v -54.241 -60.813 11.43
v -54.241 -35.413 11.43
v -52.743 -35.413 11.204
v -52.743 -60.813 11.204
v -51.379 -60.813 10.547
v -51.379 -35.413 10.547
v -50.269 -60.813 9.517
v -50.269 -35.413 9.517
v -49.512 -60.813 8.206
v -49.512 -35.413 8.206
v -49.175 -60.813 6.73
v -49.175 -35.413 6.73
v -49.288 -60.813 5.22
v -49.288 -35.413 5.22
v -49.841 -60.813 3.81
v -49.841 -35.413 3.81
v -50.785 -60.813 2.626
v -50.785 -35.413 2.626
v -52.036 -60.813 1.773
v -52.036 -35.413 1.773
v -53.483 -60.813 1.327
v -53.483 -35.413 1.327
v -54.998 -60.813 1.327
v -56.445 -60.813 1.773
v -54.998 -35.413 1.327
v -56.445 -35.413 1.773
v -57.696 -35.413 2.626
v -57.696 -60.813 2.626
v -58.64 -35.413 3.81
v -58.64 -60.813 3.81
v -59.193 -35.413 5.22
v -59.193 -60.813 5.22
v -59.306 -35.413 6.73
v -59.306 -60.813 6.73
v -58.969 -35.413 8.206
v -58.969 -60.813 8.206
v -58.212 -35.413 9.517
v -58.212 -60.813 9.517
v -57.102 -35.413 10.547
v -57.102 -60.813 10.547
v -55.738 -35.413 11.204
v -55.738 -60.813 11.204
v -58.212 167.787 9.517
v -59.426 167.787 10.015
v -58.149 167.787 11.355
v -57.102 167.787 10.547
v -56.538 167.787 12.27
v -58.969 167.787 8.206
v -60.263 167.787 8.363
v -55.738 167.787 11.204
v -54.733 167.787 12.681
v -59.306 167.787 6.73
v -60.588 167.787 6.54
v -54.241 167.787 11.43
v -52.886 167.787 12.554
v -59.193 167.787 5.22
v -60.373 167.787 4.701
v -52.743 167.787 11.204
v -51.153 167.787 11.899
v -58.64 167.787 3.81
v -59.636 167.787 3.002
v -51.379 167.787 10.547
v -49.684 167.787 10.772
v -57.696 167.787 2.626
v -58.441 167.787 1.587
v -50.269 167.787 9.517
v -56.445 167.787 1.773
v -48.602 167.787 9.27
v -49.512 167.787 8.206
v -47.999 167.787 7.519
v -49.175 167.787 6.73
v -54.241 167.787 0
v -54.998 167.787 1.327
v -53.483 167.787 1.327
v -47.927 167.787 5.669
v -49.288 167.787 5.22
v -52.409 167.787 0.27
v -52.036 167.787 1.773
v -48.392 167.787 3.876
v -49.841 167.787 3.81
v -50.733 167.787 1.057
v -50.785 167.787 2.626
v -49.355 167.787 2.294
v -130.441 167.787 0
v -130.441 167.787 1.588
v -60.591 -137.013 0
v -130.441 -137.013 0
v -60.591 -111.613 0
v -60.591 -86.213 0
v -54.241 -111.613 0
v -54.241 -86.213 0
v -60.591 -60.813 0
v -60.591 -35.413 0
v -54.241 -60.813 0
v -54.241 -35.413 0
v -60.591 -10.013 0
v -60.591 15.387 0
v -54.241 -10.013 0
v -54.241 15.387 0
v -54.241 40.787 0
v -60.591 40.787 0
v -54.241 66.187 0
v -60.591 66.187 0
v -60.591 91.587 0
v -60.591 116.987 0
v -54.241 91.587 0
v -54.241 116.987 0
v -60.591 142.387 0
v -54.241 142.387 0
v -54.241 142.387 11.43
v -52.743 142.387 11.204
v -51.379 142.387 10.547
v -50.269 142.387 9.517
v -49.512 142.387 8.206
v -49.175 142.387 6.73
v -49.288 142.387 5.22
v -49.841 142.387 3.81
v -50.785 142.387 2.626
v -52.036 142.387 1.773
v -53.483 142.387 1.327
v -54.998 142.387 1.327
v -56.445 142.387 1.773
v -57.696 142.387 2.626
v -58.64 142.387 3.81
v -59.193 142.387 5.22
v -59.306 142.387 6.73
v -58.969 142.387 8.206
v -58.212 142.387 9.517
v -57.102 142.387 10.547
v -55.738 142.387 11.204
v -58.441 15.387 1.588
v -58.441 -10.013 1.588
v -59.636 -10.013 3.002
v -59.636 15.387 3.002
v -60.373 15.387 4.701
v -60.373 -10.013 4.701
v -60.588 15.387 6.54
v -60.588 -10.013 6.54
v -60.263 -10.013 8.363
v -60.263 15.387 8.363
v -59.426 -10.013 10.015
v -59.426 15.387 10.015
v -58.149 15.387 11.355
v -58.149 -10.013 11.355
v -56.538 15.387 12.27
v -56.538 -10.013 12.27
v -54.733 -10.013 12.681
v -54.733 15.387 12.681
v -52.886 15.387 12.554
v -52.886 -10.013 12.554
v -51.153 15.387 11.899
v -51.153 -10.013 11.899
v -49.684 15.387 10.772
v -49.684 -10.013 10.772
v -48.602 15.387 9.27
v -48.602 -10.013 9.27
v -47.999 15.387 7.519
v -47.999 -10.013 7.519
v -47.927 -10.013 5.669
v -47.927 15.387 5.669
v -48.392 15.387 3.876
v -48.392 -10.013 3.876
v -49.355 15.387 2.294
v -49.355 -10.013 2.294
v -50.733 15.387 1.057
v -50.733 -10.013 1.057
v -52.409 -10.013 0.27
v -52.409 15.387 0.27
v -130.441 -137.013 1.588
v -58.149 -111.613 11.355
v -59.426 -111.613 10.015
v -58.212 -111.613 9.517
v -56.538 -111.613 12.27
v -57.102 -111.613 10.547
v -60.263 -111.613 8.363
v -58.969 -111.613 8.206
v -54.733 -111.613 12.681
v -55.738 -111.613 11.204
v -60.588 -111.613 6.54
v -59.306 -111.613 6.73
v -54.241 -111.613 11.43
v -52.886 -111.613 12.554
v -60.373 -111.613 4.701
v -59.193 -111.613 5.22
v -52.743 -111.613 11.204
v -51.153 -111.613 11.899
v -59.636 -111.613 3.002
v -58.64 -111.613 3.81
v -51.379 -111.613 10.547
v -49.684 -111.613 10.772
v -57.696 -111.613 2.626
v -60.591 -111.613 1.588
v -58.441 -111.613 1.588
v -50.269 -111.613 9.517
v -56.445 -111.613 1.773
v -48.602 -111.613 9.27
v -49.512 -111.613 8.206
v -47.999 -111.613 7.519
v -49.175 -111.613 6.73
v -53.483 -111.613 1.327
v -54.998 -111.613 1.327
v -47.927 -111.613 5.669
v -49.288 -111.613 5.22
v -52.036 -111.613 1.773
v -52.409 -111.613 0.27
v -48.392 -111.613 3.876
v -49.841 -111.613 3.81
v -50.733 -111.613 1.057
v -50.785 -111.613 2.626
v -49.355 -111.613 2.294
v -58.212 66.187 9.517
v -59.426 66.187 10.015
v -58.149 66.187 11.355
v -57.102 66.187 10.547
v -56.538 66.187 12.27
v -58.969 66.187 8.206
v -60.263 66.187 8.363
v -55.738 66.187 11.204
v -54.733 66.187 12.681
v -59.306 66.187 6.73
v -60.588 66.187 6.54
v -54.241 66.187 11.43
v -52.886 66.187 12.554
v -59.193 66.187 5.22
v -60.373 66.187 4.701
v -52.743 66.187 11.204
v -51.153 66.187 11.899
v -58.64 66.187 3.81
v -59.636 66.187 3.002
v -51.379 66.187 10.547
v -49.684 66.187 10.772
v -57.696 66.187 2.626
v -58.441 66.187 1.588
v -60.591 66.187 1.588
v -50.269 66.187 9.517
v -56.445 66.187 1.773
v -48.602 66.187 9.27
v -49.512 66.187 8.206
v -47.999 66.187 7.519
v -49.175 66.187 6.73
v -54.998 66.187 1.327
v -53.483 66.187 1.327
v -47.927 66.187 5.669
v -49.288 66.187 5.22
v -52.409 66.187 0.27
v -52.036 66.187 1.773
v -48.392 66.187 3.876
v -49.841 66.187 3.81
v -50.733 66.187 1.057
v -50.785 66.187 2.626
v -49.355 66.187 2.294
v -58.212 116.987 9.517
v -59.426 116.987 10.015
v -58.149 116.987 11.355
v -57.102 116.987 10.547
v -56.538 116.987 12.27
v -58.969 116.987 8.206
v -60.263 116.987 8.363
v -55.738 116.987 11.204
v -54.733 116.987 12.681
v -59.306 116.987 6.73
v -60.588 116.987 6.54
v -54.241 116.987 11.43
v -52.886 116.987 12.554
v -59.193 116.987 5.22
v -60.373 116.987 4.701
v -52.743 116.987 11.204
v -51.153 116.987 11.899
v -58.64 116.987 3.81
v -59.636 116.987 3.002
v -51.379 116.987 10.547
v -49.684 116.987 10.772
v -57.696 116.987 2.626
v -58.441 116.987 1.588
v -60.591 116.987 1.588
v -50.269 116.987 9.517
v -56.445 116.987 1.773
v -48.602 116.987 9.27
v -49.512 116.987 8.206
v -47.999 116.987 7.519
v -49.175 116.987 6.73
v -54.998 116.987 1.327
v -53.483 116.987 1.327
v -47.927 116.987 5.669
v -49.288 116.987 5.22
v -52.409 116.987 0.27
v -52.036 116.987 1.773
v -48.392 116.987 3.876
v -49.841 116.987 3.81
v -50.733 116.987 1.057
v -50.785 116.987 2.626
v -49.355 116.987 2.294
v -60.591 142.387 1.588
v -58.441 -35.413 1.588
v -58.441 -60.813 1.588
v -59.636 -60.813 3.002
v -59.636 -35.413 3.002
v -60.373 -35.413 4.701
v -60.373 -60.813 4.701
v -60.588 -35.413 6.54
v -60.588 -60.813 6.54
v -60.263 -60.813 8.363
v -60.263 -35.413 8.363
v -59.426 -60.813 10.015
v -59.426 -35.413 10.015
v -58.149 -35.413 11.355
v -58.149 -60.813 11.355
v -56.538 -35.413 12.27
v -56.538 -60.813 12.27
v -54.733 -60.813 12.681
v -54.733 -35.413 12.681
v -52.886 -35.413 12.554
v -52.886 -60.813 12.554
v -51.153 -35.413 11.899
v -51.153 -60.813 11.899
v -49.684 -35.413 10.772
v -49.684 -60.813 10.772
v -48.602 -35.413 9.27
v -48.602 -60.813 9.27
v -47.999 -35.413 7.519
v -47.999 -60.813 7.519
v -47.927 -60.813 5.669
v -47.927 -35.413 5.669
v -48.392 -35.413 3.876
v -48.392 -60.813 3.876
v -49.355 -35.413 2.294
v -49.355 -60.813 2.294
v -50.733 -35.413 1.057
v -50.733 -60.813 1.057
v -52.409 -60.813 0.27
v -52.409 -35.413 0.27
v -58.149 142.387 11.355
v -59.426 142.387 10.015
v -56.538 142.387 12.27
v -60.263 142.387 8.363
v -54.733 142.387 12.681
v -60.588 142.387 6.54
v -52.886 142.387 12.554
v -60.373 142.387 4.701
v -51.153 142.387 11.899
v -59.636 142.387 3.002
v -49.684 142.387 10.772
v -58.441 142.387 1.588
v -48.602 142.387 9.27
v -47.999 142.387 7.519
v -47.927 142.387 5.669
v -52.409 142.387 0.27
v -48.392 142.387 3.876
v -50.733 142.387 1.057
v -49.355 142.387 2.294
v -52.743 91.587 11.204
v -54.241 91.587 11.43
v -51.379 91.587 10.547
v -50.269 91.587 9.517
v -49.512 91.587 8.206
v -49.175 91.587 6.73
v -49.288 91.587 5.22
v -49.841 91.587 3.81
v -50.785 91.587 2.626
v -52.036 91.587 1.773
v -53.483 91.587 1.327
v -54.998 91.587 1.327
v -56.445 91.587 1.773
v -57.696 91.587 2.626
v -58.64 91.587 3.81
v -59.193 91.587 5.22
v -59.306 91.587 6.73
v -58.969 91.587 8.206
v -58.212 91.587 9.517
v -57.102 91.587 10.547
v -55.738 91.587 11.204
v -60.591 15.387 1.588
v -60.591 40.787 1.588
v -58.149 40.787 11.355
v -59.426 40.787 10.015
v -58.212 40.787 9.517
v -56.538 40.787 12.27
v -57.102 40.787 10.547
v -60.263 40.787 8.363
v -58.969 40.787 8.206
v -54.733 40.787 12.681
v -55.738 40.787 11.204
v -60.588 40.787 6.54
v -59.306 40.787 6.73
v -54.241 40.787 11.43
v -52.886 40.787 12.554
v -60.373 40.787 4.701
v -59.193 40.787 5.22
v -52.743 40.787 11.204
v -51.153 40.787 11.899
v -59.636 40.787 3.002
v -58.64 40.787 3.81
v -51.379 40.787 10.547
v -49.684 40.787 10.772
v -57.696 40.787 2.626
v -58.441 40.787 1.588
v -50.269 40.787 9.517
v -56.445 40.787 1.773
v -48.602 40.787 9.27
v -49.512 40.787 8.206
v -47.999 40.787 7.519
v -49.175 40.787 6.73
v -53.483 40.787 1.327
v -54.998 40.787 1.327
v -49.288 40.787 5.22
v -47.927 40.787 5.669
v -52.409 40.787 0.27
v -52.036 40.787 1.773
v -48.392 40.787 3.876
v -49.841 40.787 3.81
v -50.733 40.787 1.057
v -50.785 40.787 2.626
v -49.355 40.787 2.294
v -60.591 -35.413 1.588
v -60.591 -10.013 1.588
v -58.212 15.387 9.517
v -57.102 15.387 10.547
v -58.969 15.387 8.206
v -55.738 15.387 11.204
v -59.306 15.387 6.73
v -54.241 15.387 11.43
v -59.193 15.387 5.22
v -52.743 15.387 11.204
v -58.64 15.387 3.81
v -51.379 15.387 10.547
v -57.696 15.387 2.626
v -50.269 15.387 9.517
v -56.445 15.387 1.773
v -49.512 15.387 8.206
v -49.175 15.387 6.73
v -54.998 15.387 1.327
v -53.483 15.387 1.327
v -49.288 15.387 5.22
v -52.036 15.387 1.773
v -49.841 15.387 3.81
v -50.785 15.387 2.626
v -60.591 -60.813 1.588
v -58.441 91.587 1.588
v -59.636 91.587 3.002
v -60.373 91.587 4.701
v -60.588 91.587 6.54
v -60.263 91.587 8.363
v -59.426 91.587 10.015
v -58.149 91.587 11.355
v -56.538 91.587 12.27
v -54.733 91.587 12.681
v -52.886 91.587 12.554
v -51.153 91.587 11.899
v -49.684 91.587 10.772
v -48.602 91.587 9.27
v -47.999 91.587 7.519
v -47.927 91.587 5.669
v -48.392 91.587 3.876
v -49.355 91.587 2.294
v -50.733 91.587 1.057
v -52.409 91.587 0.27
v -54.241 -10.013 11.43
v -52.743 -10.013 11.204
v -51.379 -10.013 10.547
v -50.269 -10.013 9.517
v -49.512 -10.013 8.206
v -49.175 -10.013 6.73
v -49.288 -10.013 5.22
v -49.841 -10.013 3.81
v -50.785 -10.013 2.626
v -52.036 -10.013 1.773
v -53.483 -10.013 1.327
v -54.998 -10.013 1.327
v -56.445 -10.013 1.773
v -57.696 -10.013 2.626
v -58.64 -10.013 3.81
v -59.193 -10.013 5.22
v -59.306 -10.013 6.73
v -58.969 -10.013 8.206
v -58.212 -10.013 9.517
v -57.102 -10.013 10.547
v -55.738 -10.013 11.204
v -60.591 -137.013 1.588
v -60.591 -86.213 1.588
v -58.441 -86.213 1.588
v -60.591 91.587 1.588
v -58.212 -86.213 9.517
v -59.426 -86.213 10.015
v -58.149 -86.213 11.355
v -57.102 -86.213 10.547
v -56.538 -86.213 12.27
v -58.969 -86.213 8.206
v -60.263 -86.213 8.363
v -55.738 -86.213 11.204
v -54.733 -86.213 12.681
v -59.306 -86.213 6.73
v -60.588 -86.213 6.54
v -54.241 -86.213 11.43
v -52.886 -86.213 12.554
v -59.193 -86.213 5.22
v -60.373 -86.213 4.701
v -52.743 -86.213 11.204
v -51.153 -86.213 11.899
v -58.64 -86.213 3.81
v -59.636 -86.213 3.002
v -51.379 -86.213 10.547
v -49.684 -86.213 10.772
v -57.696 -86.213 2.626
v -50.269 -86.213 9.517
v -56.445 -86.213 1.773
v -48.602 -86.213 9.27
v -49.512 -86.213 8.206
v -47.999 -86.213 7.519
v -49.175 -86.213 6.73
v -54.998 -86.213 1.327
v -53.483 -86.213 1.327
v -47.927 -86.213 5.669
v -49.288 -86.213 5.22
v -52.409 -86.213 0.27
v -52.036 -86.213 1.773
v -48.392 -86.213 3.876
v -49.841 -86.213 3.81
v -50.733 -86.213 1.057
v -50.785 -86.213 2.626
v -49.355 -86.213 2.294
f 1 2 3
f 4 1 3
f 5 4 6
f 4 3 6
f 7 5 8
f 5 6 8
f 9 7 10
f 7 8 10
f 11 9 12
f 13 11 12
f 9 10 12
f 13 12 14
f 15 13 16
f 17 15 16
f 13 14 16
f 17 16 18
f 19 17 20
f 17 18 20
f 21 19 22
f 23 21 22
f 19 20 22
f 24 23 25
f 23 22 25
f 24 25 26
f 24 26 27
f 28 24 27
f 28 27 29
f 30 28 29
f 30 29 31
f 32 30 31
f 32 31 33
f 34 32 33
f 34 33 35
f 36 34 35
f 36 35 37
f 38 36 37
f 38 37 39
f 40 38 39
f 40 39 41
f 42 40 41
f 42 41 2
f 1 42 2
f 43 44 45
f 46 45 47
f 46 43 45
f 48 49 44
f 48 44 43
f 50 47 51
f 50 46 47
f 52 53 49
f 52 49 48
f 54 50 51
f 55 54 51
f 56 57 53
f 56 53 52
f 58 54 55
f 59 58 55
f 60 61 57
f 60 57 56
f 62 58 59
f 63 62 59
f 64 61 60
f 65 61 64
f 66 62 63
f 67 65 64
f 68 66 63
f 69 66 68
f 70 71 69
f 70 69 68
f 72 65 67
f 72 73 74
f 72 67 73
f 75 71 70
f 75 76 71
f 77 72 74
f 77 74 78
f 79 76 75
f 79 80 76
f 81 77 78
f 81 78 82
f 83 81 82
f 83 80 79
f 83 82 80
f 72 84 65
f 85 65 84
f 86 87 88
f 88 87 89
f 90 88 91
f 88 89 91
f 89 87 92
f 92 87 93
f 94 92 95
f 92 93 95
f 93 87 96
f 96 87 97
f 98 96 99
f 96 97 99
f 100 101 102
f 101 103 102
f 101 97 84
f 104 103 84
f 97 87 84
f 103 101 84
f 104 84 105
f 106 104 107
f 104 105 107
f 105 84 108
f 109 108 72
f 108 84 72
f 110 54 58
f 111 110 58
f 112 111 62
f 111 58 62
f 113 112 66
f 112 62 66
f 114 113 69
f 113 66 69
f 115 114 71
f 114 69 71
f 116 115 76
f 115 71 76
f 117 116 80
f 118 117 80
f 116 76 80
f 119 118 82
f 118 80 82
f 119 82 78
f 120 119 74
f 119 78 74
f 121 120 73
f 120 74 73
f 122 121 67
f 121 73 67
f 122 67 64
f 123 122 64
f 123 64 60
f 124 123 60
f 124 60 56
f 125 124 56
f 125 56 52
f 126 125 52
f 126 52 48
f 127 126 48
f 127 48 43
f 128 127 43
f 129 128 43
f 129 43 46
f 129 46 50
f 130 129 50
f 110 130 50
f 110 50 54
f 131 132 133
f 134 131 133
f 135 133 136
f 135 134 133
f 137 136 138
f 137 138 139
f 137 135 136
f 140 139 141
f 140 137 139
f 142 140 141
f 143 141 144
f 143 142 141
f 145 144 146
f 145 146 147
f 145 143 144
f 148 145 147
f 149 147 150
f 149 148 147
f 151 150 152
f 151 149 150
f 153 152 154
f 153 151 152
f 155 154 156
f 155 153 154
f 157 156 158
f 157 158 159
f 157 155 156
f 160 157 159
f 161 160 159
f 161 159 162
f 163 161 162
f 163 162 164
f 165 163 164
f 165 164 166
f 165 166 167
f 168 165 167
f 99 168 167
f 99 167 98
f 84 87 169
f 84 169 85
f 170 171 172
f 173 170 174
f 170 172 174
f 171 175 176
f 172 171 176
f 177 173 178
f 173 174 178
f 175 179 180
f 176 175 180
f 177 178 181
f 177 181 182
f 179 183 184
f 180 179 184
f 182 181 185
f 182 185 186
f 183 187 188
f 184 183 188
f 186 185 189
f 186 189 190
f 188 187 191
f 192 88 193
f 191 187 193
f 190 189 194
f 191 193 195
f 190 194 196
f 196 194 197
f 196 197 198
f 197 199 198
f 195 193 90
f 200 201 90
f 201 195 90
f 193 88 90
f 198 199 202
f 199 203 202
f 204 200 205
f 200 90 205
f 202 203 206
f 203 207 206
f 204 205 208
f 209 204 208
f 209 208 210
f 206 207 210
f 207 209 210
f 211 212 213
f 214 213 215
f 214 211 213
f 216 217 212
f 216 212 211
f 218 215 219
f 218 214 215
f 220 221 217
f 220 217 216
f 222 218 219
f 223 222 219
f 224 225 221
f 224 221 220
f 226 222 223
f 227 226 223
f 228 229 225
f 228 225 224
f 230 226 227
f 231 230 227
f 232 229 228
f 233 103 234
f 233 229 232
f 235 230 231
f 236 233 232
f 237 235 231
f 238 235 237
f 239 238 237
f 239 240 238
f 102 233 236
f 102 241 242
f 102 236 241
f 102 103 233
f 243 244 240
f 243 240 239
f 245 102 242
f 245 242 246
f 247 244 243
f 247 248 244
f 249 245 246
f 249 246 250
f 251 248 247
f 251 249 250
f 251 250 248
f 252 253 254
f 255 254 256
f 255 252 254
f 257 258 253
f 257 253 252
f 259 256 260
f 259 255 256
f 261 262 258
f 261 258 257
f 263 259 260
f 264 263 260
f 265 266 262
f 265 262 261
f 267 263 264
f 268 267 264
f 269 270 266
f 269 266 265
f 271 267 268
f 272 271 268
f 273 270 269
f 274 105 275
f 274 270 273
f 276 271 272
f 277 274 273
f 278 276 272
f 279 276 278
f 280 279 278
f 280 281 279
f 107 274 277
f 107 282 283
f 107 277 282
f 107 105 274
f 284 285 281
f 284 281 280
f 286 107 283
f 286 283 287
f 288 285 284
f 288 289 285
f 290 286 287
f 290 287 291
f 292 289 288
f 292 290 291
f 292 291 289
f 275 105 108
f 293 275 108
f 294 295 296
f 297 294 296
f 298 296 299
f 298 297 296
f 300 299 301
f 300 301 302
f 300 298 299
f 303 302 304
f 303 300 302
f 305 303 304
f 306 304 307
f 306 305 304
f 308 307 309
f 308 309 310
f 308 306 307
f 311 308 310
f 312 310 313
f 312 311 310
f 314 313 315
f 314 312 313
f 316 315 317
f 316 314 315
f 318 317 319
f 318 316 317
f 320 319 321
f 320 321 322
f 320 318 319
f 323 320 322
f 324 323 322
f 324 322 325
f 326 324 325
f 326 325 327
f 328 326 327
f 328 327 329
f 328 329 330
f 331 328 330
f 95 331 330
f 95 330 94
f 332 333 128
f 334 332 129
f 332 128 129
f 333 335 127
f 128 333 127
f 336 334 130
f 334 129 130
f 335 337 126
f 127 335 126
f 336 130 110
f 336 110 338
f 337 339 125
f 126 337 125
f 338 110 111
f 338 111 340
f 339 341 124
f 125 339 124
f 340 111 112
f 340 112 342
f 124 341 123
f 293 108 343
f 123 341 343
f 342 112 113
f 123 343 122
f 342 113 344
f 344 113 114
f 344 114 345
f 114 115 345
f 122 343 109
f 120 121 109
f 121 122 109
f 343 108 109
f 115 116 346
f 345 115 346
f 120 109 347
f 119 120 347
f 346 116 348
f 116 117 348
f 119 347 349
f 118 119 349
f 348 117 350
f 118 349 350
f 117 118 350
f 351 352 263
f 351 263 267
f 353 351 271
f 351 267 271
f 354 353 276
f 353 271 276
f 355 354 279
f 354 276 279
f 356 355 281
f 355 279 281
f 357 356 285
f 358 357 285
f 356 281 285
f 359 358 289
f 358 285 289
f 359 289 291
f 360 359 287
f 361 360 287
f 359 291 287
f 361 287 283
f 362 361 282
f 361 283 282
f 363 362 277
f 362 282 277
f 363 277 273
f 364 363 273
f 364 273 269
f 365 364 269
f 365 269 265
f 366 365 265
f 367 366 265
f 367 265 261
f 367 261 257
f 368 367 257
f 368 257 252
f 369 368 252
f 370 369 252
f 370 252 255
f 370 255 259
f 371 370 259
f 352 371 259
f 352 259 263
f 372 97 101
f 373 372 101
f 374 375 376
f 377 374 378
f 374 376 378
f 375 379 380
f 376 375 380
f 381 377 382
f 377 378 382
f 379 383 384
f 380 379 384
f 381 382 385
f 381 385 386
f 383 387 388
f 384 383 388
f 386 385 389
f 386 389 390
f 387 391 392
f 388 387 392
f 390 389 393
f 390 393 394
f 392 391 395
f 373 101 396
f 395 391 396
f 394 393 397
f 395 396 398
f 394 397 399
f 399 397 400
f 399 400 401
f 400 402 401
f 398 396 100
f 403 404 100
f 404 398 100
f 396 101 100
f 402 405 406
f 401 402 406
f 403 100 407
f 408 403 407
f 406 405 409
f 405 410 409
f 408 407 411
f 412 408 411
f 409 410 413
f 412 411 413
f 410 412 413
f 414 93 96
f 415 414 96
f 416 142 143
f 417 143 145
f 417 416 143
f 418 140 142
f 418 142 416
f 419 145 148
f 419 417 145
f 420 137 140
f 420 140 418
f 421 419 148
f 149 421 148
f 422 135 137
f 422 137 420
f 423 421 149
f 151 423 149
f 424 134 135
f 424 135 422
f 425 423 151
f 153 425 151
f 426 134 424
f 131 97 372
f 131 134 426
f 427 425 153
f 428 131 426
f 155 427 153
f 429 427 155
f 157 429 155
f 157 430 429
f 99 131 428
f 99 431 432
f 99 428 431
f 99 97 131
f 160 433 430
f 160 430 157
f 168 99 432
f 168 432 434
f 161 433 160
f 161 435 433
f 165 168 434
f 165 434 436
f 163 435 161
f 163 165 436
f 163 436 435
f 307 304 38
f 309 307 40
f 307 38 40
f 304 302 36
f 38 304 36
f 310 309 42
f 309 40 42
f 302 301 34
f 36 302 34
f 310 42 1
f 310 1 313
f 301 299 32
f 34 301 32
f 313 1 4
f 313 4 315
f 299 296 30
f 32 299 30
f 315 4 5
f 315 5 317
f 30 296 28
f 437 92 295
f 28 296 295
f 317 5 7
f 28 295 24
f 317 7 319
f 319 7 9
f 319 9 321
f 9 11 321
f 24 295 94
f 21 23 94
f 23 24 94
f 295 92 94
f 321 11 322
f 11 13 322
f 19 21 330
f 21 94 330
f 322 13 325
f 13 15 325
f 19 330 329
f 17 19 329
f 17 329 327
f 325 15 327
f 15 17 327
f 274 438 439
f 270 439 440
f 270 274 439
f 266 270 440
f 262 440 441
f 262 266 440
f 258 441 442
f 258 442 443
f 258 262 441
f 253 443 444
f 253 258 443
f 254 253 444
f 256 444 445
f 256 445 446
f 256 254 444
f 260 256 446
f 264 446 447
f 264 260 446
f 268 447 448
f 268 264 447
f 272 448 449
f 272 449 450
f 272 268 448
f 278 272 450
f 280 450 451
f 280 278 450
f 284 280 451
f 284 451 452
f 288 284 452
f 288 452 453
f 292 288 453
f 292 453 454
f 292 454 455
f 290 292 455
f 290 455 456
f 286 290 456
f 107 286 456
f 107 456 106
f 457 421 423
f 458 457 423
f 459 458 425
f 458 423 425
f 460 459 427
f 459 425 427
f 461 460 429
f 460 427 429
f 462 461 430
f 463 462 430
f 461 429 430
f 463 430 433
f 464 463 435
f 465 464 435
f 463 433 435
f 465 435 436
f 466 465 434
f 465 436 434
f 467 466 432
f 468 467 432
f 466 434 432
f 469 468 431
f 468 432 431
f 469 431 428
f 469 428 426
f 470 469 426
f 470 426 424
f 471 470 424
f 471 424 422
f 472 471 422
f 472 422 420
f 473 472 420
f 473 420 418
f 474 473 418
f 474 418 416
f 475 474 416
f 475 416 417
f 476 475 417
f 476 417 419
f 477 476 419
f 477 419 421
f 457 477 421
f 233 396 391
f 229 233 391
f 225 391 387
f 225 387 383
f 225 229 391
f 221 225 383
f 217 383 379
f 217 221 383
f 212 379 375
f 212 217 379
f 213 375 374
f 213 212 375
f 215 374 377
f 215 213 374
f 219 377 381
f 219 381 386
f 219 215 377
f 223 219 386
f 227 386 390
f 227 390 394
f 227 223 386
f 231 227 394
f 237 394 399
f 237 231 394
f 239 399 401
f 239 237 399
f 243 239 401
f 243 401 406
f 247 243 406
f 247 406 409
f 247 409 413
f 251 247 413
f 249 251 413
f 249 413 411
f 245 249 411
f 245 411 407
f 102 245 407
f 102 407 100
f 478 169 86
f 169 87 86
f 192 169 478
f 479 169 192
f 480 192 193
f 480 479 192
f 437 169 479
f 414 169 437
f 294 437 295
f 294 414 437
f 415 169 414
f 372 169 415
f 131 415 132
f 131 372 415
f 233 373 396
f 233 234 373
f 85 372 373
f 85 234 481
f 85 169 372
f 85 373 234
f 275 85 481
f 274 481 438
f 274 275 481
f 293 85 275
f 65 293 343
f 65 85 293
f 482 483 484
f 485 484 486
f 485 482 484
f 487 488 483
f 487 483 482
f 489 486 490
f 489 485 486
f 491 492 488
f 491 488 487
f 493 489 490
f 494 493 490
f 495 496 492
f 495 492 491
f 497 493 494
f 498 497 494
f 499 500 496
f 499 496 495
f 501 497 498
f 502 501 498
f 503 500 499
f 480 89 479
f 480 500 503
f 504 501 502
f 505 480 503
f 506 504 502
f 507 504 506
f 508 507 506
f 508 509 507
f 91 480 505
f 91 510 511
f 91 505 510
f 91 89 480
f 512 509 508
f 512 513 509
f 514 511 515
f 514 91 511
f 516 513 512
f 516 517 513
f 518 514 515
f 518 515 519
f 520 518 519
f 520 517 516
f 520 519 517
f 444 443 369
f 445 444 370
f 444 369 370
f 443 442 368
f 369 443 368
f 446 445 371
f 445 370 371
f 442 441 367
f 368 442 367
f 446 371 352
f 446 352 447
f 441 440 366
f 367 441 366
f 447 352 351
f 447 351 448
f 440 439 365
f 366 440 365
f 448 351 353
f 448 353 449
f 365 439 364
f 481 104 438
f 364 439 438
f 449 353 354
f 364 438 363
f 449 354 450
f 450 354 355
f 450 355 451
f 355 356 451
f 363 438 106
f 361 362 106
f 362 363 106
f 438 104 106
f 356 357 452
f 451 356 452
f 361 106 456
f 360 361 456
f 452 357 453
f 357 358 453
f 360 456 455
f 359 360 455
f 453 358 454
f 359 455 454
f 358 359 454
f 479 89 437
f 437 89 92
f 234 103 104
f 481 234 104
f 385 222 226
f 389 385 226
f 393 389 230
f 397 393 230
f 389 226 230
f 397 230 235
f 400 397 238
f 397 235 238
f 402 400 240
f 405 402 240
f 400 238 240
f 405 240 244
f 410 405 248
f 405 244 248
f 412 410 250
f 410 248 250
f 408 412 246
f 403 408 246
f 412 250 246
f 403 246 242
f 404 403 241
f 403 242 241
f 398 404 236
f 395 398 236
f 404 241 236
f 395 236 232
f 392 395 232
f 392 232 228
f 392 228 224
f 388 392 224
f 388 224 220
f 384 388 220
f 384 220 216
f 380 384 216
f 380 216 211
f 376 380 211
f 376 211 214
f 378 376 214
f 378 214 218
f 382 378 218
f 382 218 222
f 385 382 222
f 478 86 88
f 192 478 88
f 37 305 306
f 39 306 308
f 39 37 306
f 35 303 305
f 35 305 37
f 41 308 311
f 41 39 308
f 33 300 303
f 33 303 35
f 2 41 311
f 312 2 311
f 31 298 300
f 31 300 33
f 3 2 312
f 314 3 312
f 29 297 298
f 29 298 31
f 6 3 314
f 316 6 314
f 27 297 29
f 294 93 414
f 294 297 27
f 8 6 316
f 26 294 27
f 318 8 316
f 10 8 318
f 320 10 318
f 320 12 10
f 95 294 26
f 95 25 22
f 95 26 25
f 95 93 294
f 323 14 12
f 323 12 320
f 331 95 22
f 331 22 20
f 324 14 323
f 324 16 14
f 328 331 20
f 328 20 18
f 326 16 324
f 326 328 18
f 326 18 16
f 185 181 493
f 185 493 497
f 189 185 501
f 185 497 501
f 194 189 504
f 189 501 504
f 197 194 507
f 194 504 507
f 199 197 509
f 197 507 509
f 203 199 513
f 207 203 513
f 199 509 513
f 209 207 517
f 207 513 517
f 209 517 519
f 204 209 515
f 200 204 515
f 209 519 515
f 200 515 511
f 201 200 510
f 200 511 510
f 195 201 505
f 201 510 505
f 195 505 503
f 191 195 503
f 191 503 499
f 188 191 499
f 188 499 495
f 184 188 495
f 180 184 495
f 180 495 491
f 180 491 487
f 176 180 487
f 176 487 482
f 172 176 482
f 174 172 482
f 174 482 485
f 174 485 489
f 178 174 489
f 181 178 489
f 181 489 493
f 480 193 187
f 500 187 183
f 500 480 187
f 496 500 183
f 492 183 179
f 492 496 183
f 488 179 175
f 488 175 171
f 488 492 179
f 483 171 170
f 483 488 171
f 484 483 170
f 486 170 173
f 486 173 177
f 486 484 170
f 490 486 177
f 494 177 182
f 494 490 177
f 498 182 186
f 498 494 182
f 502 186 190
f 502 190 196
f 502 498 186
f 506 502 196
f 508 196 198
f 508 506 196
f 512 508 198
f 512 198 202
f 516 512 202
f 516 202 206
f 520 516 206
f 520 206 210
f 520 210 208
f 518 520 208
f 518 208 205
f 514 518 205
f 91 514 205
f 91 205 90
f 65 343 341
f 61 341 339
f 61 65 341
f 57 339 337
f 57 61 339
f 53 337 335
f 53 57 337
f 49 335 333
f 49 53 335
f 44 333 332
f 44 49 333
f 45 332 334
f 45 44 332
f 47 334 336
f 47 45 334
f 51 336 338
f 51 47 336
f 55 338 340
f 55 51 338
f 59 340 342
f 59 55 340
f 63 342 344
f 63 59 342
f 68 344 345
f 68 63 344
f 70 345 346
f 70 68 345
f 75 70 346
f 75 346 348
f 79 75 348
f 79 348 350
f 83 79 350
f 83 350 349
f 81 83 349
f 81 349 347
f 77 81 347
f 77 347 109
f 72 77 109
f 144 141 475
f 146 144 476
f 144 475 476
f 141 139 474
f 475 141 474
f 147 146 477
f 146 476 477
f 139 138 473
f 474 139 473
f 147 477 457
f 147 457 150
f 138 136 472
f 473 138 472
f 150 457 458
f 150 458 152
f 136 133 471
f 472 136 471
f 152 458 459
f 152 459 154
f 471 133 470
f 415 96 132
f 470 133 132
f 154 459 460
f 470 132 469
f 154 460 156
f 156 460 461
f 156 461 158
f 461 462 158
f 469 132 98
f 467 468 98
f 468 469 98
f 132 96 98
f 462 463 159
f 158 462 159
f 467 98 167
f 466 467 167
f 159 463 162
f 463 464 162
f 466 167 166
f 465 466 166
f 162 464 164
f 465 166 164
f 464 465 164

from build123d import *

# Parameters (mm, degrees)
SKETCH1_W               = 76.2
SKETCH1_H               = 304.8
BOSS_EXTRUDE1_DEPTH     = 1.5875
SKETCH2_R               = 6.35
BOSS_EXTRUDE2_DEPTH     = 304.8
CUT_EXTRUDE1_DEPTH      = 72.4535
CUT_EXTRUDE1_DEPTH_BACK = 72.4535
SKETCH3_W               = 22.233491501
SKETCH3_H               = 25.4
SKETCH3_W_2             = 25.169990379
SKETCH3_W_3             = 20.176908814
SKETCH4_R               = 5.08
CUT_EXTRUDE2_DEPTH      = 332.781682839


with BuildPart() as part:
    # Sketch1 → Boss-Extrude1 (new body)
    with BuildSketch(Plane.XY):
        with Locations((-92.340618933, 15.386782554)):
            Rectangle(SKETCH1_W, SKETCH1_H)
    extrude(amount=BOSS_EXTRUDE1_DEPTH)

    # Sketch2 → Boss-Extrude2 (add)
    with BuildSketch(Plane(origin=(0, 167.786782554, 0), x_dir=(1, 0, 0), z_dir=(0, 1, 0))):
        with Locations((-54.240618933, -6.35)):
            Circle(SKETCH2_R)
    extrude(amount=-BOSS_EXTRUDE2_DEPTH)

    # Sketch3 → Cut-Extrude1 (cut, two sides: drawn at the far end of the back side and taken through both)
    with BuildSketch(Plane.XY.offset(1.5875).offset(-CUT_EXTRUDE1_DEPTH_BACK)):
        with Locations((-49.473873183, 129.686782554)):
            Rectangle(SKETCH3_W, SKETCH3_H)
        with Locations((-49.473873183, 78.886782554)):
            Rectangle(SKETCH3_W, SKETCH3_H)
        with Locations((-49.473873183, 28.086782554)):
            Rectangle(SKETCH3_W, SKETCH3_H)
        with Locations((-49.473873183, -22.713217446)):
            Rectangle(SKETCH3_W, SKETCH3_H)
        with Locations((-48.005623744, -73.513217446)):
            Rectangle(SKETCH3_W_2, SKETCH3_H)
        with Locations((-50.502164526, -124.313217446)):
            Rectangle(SKETCH3_W_3, SKETCH3_H)
    extrude(amount=CUT_EXTRUDE1_DEPTH + CUT_EXTRUDE1_DEPTH_BACK, mode=Mode.SUBTRACT)

    # Sketch4 → Cut-Extrude2 (cut, through all)
    with BuildSketch(Plane(origin=(0, 167.786782554, 0), x_dir=(1, 0, 0), z_dir=(0, 1, 0))):
        with Locations(Location((-54.240618933, -6.35, 0), (0, 0, 270))):
            Circle(SKETCH4_R)
    extrude(amount=-CUT_EXTRUDE2_DEPTH, mode=Mode.SUBTRACT)


solid = part.part
